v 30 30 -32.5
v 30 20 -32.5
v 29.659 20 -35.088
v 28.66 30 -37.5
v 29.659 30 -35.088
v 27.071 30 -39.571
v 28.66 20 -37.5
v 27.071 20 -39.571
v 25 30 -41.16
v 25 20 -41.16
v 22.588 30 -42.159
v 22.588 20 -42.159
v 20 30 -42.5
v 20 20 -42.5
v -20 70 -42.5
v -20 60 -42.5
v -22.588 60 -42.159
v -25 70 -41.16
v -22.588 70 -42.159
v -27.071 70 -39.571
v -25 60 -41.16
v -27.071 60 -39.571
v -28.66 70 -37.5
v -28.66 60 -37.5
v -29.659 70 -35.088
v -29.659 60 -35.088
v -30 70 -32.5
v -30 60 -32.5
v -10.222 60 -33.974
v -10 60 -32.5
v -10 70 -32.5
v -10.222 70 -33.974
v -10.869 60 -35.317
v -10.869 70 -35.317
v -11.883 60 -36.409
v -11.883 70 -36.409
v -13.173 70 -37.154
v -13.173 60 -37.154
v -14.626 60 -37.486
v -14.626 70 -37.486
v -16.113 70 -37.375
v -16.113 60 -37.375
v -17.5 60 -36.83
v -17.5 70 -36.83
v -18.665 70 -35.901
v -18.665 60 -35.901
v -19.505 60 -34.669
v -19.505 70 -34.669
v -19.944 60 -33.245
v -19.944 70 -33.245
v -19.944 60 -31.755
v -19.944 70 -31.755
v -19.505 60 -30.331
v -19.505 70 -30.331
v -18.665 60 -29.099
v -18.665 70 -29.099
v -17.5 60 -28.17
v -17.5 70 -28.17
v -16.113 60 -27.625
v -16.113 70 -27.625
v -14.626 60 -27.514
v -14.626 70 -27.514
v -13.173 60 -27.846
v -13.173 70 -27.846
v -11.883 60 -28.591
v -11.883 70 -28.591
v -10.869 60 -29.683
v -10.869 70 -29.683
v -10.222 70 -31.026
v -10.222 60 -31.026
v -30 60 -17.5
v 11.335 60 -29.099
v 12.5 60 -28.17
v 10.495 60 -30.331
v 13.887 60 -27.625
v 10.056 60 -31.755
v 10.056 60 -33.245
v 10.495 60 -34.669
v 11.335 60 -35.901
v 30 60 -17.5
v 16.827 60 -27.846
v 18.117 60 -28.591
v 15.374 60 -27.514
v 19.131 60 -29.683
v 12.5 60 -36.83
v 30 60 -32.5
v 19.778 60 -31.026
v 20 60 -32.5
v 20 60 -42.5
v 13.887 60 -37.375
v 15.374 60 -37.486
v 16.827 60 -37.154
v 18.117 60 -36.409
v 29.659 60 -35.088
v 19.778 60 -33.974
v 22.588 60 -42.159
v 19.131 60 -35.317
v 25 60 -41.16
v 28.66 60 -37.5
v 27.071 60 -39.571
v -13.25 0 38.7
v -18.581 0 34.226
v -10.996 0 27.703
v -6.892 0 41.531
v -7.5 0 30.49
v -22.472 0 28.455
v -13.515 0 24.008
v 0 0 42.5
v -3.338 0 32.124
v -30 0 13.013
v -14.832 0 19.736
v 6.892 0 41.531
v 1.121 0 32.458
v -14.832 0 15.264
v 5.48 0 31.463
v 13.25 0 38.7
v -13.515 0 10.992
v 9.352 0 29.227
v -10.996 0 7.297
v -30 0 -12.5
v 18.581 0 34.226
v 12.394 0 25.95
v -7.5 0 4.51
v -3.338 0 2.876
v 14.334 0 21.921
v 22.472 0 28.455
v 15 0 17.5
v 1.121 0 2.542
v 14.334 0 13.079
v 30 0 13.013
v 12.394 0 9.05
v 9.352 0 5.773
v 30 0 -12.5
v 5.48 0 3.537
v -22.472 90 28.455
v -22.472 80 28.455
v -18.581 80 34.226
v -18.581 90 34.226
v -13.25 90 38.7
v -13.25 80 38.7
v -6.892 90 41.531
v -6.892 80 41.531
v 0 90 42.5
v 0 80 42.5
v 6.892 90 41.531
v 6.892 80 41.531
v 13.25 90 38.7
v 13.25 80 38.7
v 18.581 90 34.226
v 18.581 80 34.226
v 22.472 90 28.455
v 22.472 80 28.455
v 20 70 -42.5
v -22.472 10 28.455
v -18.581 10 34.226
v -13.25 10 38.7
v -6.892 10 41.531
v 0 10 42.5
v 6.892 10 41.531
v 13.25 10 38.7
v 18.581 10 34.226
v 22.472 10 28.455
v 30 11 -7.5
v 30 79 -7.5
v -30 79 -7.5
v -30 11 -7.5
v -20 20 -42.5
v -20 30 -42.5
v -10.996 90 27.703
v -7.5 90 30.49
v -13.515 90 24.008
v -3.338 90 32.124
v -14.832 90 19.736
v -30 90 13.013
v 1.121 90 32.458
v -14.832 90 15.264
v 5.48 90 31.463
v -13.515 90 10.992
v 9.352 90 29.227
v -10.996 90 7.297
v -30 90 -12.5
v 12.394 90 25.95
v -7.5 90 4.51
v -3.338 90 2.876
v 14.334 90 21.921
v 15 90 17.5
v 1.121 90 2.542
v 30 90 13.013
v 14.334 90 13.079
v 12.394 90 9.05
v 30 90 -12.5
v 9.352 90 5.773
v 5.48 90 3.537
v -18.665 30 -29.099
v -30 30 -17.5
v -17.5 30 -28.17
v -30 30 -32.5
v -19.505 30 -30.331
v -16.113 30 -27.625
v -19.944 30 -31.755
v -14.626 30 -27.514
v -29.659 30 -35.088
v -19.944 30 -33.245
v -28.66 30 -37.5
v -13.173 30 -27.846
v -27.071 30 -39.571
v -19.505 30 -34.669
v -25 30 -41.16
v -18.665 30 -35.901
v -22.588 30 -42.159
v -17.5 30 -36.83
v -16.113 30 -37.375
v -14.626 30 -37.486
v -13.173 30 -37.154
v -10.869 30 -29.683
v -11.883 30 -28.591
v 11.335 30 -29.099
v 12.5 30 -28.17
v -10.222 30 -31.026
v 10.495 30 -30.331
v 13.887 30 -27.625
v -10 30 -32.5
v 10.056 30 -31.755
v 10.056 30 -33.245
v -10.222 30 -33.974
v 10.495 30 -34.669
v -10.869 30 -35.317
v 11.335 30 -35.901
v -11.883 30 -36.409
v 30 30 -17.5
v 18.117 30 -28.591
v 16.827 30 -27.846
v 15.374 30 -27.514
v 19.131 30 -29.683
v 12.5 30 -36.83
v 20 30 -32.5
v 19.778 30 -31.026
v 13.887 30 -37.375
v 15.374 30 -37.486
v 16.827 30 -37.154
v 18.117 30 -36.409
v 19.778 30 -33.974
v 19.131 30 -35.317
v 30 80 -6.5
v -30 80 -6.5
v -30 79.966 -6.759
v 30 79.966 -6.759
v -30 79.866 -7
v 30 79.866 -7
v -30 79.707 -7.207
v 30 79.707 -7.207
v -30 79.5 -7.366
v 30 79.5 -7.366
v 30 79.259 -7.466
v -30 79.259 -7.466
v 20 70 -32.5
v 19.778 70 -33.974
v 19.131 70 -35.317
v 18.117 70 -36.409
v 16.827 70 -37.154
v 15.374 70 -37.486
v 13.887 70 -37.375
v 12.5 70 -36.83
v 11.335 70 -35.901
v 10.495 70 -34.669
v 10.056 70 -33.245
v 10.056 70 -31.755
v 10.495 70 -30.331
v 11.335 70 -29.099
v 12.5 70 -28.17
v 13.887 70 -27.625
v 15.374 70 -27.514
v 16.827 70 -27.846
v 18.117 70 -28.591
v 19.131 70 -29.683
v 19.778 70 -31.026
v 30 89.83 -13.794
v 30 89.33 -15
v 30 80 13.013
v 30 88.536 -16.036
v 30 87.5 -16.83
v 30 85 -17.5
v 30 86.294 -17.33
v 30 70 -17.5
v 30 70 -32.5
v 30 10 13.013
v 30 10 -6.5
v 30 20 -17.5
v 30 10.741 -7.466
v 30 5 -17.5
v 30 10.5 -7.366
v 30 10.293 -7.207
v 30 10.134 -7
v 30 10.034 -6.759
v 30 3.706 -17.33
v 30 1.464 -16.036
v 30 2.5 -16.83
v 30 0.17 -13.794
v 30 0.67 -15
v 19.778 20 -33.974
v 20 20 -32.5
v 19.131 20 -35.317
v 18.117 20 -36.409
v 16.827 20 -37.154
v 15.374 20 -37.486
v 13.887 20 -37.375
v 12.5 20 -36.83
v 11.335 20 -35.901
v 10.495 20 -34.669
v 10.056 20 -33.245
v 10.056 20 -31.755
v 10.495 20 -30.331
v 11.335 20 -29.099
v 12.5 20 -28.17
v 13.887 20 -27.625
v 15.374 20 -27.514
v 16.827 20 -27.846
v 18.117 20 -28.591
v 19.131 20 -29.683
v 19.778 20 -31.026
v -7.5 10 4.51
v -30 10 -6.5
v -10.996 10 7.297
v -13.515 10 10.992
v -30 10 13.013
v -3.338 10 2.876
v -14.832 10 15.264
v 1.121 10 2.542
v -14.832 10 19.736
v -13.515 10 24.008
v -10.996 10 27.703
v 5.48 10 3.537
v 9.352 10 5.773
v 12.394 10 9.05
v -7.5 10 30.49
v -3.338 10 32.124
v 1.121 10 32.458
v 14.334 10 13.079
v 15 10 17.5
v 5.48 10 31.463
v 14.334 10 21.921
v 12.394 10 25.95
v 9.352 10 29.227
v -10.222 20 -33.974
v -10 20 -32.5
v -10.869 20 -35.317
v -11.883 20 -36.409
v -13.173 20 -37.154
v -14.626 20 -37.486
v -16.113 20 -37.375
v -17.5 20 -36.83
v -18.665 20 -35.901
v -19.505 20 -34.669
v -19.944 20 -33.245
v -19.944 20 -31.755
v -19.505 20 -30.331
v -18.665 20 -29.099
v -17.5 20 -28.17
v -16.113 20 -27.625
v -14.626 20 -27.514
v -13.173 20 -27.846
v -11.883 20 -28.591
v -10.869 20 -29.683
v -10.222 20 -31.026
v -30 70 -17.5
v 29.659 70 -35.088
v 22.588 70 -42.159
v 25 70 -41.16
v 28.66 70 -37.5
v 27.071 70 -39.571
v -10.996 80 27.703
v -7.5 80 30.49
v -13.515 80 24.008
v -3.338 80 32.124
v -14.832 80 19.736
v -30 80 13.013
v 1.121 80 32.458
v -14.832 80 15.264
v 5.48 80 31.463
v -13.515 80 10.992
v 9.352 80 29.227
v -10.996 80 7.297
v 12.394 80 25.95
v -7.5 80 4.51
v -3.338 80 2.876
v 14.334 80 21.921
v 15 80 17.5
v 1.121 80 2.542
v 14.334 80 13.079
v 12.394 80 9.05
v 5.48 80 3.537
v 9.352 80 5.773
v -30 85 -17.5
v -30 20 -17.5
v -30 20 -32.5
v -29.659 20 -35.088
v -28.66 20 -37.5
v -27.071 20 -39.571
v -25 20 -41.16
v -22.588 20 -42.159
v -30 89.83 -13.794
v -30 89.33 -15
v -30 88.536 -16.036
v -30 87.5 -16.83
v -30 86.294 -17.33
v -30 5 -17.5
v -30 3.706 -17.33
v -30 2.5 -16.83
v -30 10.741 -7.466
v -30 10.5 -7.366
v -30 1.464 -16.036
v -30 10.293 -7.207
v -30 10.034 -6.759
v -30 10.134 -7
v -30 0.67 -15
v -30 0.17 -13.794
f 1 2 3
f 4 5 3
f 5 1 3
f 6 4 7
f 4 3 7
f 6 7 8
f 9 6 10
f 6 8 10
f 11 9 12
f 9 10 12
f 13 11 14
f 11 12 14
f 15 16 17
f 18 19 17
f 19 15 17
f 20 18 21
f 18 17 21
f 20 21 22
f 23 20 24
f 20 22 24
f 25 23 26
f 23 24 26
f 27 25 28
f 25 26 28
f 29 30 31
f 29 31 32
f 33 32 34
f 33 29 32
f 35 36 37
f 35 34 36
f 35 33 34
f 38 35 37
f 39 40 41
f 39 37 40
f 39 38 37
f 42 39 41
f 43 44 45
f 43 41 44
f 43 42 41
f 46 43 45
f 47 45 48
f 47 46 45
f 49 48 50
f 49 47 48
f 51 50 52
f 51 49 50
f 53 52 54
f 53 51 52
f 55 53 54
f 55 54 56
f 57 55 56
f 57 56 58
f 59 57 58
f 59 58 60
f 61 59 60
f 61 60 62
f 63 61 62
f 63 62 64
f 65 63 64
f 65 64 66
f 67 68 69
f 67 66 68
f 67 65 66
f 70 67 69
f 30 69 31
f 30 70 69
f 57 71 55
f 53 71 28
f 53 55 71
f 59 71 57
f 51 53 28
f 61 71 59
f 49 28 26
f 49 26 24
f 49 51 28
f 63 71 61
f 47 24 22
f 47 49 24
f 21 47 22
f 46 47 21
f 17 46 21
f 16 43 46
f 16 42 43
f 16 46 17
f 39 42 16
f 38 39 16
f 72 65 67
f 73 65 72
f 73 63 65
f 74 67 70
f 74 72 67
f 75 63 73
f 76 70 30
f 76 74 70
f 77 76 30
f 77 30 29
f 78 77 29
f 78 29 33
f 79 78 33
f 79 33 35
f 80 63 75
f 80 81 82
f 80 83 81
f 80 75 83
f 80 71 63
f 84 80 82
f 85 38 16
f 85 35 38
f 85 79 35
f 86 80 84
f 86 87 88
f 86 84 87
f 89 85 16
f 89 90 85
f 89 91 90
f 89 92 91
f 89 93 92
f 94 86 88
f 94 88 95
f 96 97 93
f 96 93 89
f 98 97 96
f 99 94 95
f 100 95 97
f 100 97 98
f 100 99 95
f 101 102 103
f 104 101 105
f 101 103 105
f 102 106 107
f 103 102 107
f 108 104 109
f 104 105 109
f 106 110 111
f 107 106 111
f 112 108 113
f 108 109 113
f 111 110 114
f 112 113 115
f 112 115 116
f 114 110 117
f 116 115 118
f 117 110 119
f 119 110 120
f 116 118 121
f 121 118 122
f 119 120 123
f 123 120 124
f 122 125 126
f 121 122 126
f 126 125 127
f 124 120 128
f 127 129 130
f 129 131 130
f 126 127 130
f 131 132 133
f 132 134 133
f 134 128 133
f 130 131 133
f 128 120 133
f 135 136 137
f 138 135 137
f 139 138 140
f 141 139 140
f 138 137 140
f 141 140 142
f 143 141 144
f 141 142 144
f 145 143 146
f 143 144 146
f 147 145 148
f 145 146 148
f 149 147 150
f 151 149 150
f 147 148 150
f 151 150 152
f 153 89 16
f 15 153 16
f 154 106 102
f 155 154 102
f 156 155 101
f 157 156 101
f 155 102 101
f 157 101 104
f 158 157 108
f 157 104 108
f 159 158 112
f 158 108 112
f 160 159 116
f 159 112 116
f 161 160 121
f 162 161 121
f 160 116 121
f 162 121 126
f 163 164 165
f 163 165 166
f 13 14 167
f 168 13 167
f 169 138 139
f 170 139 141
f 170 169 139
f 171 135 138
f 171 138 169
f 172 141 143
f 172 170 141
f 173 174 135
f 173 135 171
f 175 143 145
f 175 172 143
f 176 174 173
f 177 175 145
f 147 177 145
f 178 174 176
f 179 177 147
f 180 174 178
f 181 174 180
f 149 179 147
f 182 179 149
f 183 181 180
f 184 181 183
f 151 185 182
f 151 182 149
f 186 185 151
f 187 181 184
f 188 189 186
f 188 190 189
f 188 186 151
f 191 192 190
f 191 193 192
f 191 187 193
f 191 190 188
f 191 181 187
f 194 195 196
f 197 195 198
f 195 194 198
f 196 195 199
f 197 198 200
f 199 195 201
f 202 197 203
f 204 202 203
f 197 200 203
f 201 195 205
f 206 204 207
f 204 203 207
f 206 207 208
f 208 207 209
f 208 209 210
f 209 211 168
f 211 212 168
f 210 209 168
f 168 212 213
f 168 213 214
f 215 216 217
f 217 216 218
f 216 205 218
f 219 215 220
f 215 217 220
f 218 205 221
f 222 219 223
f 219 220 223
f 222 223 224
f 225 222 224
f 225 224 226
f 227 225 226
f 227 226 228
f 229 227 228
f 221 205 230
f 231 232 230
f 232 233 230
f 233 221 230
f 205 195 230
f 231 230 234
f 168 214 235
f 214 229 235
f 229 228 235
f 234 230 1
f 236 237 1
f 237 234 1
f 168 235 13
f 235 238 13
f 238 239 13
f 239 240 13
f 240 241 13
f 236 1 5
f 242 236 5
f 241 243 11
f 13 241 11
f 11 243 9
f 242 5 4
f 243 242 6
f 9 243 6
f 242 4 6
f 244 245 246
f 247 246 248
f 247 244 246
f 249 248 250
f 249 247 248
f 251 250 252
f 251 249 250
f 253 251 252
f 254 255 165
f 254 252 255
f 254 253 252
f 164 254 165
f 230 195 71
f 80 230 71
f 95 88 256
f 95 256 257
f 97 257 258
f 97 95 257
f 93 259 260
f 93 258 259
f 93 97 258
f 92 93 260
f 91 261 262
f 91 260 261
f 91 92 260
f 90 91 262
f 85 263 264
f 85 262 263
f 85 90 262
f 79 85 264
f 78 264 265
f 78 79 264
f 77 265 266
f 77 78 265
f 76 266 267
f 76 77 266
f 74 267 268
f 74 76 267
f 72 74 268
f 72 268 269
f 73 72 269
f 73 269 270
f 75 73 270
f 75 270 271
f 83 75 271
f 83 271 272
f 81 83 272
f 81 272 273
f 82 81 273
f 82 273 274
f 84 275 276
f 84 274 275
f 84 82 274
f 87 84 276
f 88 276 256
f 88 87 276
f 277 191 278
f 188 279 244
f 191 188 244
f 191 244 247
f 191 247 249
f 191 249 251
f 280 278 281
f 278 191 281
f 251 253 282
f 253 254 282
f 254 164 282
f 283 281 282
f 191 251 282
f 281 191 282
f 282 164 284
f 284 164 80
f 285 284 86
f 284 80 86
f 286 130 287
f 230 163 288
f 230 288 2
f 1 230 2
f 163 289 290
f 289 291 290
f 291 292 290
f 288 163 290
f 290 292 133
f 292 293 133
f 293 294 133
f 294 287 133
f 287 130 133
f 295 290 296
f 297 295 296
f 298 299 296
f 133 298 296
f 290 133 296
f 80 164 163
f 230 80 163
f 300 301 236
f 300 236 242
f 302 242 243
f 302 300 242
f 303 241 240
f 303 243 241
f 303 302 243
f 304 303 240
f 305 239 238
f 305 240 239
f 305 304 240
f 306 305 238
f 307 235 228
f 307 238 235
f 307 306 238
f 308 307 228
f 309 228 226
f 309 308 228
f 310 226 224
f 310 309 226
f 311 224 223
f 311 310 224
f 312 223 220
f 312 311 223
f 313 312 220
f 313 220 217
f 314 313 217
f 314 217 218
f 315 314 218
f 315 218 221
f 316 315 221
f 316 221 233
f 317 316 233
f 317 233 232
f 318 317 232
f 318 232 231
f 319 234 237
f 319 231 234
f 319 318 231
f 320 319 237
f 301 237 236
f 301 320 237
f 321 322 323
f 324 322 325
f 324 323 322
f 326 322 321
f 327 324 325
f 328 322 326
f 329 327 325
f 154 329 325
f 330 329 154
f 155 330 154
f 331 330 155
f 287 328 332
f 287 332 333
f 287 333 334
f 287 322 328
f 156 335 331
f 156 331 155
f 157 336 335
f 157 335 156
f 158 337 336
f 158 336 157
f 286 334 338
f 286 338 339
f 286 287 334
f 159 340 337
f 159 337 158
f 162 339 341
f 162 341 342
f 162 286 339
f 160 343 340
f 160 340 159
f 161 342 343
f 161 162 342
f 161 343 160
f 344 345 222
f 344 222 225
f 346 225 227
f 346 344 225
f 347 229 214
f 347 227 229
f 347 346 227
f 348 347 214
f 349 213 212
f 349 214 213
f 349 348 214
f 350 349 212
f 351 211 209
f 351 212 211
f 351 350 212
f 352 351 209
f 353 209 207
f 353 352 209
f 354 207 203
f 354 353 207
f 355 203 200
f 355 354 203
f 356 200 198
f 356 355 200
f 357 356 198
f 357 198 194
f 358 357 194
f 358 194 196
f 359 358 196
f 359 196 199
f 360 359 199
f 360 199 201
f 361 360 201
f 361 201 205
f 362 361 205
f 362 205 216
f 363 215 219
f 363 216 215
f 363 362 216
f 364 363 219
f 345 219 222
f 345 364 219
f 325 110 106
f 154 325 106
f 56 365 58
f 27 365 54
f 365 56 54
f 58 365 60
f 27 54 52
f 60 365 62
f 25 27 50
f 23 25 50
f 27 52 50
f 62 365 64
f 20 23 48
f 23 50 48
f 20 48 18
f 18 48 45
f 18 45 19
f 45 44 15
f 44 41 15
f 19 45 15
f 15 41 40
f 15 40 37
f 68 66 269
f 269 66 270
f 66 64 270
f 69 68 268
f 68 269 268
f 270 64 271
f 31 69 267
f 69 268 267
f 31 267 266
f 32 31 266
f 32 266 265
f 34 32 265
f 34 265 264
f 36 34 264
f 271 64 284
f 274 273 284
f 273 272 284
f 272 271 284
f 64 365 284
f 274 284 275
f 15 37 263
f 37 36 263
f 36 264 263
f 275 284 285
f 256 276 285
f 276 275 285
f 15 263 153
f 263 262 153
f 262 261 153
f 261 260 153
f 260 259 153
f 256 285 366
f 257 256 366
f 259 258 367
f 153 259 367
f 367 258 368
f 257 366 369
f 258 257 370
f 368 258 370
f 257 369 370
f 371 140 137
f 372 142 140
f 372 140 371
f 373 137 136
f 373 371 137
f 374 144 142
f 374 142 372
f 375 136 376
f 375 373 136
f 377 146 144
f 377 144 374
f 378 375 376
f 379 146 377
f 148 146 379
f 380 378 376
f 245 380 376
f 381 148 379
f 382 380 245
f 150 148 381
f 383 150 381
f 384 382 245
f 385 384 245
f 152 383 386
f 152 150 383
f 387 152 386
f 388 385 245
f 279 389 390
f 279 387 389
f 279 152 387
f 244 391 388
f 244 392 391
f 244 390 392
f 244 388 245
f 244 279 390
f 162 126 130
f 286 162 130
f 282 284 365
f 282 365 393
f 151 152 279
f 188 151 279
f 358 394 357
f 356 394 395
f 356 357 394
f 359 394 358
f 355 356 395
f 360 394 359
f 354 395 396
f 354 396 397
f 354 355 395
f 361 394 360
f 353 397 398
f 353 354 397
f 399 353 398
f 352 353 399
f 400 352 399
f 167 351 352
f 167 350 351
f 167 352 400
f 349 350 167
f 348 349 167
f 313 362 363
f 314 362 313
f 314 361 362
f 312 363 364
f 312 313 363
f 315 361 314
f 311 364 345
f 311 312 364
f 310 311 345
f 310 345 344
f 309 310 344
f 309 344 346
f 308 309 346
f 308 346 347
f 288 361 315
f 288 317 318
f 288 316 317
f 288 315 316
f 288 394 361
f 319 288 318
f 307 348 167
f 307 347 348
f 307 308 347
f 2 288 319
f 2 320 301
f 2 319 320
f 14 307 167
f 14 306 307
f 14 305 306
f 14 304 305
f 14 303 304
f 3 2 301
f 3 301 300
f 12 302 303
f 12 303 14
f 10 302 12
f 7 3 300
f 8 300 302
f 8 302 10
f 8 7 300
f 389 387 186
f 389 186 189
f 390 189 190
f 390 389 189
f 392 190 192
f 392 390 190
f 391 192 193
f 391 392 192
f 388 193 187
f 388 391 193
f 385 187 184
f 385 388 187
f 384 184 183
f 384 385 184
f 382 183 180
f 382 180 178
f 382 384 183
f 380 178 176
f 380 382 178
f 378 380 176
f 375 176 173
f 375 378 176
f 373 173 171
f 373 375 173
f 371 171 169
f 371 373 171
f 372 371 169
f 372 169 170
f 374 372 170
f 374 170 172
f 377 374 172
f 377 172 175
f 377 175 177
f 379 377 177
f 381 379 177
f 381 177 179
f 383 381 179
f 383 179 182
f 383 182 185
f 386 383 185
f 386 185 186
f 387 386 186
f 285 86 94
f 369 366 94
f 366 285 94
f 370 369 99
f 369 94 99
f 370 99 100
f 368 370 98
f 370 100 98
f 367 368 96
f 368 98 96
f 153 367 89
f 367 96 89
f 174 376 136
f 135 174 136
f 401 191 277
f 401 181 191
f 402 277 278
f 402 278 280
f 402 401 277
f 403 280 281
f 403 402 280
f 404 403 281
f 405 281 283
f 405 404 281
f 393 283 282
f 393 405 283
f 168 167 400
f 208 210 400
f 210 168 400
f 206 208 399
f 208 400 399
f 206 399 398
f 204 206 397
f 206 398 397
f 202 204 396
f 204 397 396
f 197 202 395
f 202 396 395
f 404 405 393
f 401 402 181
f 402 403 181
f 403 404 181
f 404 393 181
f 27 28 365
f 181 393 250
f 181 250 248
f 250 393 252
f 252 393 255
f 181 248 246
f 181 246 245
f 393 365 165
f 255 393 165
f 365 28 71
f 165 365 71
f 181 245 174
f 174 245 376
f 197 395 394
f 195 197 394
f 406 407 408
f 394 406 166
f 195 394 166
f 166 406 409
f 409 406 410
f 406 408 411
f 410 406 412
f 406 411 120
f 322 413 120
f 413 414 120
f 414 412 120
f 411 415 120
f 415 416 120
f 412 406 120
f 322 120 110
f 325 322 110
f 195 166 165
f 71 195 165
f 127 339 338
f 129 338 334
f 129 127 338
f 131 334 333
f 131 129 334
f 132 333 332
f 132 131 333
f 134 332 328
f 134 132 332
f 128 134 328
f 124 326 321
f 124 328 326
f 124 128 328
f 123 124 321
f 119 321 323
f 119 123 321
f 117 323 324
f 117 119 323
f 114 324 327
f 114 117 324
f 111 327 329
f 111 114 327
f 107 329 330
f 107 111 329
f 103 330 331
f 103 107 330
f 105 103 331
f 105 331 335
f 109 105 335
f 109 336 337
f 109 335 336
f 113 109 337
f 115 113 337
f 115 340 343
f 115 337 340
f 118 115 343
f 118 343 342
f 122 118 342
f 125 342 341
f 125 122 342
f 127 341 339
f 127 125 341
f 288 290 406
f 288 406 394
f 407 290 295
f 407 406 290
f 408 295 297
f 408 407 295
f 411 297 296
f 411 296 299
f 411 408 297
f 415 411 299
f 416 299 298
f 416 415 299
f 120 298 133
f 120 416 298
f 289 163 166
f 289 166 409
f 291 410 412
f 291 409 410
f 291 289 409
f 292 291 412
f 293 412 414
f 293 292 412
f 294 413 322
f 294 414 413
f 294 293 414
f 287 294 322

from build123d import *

# Parameters (mm, degrees)
SKETCH1_R           = 5
SKETCH1_R_2         = 15
BOSS_EXTRUDE1_DEPTH = 90
SKETCH2_W           = 25
SKETCH2_H           = 20
SKETCH2_H_2         = 30
CUT_EXTRUDE1_DEPTH  = 61
FILLET1_R           = 5


with BuildPart() as part:
    # Sketch1 → Boss-Extrude1 (new body)
    with BuildSketch(Plane(origin=(0, 0, 0), x_dir=(1, 0, 0), z_dir=(0, 1, 0))):
        with BuildLine():
            Line((30, 0), (30, 32.5))
            ThreePointArc((30, 32.5), (27.071067812, 39.571067812), (20, 42.5))
            Line((20, 42.5), (-20, 42.5))
            ThreePointArc((-20, 42.5), (-27.071067812, 39.571067812), (-30, 32.5))
            Line((-30, 32.5), (-30, 0))
            Line((-30, 0), (-30, -13.012820513))
            Line((-30, -13.012820513), (-22.471910112, -28.45505618))
            ThreePointArc((-22.471910112, -28.45505618), (0, -42.5), (22.471910112, -28.45505618))
            Line((22.471910112, -28.45505618), (30, -13.012820513))
            Line((30, -13.012820513), (30, 0))
        make_face()
        with Locations((-15, 32.5)):
            Circle(SKETCH1_R, mode=Mode.SUBTRACT)
        with Locations((15, 32.5)):
            Circle(SKETCH1_R, mode=Mode.SUBTRACT)
        with Locations((0, -17.5)):
            Circle(SKETCH1_R_2, mode=Mode.SUBTRACT)
    extrude(amount=BOSS_EXTRUDE1_DEPTH)

    # Sketch2 → Cut-Extrude1 (cut, through all)
    with BuildSketch(Plane(origin=(30, 0, 0), x_dir=(0, 0, -1), z_dir=(1, 0, 0))):
        with BuildLine():
            Line((-42.5, 80), (6.5, 80))
            ThreePointArc((6.5, 80), (7.207106781, 79.707106781), (7.5, 79))
            Line((7.5, 79), (7.5, 11))
            ThreePointArc((7.5, 11), (7.207106781, 10.292893219), (6.5, 10))
            Line((6.5, 10), (-42.5, 10))
            Line((-42.5, 10), (-42.5, 80))
        make_face()
        with Locations((30, 80)):
            Rectangle(SKETCH2_W, SKETCH2_H)
        with Locations((30, 10)):
            Rectangle(SKETCH2_W, SKETCH2_H)
        with Locations((30, 45)):
            Rectangle(SKETCH2_W, SKETCH2_H_2)
    extrude(amount=-CUT_EXTRUDE1_DEPTH, mode=Mode.SUBTRACT)

    # Fillet1
    fillet1_edges = [part.edges().sort_by_distance(p)[0] for p in [
        (0, 0, -17.5),
        (0, 90, -17.5),
    ]]
    fillet(fillet1_edges, radius=FILLET1_R)


solid = part.part
